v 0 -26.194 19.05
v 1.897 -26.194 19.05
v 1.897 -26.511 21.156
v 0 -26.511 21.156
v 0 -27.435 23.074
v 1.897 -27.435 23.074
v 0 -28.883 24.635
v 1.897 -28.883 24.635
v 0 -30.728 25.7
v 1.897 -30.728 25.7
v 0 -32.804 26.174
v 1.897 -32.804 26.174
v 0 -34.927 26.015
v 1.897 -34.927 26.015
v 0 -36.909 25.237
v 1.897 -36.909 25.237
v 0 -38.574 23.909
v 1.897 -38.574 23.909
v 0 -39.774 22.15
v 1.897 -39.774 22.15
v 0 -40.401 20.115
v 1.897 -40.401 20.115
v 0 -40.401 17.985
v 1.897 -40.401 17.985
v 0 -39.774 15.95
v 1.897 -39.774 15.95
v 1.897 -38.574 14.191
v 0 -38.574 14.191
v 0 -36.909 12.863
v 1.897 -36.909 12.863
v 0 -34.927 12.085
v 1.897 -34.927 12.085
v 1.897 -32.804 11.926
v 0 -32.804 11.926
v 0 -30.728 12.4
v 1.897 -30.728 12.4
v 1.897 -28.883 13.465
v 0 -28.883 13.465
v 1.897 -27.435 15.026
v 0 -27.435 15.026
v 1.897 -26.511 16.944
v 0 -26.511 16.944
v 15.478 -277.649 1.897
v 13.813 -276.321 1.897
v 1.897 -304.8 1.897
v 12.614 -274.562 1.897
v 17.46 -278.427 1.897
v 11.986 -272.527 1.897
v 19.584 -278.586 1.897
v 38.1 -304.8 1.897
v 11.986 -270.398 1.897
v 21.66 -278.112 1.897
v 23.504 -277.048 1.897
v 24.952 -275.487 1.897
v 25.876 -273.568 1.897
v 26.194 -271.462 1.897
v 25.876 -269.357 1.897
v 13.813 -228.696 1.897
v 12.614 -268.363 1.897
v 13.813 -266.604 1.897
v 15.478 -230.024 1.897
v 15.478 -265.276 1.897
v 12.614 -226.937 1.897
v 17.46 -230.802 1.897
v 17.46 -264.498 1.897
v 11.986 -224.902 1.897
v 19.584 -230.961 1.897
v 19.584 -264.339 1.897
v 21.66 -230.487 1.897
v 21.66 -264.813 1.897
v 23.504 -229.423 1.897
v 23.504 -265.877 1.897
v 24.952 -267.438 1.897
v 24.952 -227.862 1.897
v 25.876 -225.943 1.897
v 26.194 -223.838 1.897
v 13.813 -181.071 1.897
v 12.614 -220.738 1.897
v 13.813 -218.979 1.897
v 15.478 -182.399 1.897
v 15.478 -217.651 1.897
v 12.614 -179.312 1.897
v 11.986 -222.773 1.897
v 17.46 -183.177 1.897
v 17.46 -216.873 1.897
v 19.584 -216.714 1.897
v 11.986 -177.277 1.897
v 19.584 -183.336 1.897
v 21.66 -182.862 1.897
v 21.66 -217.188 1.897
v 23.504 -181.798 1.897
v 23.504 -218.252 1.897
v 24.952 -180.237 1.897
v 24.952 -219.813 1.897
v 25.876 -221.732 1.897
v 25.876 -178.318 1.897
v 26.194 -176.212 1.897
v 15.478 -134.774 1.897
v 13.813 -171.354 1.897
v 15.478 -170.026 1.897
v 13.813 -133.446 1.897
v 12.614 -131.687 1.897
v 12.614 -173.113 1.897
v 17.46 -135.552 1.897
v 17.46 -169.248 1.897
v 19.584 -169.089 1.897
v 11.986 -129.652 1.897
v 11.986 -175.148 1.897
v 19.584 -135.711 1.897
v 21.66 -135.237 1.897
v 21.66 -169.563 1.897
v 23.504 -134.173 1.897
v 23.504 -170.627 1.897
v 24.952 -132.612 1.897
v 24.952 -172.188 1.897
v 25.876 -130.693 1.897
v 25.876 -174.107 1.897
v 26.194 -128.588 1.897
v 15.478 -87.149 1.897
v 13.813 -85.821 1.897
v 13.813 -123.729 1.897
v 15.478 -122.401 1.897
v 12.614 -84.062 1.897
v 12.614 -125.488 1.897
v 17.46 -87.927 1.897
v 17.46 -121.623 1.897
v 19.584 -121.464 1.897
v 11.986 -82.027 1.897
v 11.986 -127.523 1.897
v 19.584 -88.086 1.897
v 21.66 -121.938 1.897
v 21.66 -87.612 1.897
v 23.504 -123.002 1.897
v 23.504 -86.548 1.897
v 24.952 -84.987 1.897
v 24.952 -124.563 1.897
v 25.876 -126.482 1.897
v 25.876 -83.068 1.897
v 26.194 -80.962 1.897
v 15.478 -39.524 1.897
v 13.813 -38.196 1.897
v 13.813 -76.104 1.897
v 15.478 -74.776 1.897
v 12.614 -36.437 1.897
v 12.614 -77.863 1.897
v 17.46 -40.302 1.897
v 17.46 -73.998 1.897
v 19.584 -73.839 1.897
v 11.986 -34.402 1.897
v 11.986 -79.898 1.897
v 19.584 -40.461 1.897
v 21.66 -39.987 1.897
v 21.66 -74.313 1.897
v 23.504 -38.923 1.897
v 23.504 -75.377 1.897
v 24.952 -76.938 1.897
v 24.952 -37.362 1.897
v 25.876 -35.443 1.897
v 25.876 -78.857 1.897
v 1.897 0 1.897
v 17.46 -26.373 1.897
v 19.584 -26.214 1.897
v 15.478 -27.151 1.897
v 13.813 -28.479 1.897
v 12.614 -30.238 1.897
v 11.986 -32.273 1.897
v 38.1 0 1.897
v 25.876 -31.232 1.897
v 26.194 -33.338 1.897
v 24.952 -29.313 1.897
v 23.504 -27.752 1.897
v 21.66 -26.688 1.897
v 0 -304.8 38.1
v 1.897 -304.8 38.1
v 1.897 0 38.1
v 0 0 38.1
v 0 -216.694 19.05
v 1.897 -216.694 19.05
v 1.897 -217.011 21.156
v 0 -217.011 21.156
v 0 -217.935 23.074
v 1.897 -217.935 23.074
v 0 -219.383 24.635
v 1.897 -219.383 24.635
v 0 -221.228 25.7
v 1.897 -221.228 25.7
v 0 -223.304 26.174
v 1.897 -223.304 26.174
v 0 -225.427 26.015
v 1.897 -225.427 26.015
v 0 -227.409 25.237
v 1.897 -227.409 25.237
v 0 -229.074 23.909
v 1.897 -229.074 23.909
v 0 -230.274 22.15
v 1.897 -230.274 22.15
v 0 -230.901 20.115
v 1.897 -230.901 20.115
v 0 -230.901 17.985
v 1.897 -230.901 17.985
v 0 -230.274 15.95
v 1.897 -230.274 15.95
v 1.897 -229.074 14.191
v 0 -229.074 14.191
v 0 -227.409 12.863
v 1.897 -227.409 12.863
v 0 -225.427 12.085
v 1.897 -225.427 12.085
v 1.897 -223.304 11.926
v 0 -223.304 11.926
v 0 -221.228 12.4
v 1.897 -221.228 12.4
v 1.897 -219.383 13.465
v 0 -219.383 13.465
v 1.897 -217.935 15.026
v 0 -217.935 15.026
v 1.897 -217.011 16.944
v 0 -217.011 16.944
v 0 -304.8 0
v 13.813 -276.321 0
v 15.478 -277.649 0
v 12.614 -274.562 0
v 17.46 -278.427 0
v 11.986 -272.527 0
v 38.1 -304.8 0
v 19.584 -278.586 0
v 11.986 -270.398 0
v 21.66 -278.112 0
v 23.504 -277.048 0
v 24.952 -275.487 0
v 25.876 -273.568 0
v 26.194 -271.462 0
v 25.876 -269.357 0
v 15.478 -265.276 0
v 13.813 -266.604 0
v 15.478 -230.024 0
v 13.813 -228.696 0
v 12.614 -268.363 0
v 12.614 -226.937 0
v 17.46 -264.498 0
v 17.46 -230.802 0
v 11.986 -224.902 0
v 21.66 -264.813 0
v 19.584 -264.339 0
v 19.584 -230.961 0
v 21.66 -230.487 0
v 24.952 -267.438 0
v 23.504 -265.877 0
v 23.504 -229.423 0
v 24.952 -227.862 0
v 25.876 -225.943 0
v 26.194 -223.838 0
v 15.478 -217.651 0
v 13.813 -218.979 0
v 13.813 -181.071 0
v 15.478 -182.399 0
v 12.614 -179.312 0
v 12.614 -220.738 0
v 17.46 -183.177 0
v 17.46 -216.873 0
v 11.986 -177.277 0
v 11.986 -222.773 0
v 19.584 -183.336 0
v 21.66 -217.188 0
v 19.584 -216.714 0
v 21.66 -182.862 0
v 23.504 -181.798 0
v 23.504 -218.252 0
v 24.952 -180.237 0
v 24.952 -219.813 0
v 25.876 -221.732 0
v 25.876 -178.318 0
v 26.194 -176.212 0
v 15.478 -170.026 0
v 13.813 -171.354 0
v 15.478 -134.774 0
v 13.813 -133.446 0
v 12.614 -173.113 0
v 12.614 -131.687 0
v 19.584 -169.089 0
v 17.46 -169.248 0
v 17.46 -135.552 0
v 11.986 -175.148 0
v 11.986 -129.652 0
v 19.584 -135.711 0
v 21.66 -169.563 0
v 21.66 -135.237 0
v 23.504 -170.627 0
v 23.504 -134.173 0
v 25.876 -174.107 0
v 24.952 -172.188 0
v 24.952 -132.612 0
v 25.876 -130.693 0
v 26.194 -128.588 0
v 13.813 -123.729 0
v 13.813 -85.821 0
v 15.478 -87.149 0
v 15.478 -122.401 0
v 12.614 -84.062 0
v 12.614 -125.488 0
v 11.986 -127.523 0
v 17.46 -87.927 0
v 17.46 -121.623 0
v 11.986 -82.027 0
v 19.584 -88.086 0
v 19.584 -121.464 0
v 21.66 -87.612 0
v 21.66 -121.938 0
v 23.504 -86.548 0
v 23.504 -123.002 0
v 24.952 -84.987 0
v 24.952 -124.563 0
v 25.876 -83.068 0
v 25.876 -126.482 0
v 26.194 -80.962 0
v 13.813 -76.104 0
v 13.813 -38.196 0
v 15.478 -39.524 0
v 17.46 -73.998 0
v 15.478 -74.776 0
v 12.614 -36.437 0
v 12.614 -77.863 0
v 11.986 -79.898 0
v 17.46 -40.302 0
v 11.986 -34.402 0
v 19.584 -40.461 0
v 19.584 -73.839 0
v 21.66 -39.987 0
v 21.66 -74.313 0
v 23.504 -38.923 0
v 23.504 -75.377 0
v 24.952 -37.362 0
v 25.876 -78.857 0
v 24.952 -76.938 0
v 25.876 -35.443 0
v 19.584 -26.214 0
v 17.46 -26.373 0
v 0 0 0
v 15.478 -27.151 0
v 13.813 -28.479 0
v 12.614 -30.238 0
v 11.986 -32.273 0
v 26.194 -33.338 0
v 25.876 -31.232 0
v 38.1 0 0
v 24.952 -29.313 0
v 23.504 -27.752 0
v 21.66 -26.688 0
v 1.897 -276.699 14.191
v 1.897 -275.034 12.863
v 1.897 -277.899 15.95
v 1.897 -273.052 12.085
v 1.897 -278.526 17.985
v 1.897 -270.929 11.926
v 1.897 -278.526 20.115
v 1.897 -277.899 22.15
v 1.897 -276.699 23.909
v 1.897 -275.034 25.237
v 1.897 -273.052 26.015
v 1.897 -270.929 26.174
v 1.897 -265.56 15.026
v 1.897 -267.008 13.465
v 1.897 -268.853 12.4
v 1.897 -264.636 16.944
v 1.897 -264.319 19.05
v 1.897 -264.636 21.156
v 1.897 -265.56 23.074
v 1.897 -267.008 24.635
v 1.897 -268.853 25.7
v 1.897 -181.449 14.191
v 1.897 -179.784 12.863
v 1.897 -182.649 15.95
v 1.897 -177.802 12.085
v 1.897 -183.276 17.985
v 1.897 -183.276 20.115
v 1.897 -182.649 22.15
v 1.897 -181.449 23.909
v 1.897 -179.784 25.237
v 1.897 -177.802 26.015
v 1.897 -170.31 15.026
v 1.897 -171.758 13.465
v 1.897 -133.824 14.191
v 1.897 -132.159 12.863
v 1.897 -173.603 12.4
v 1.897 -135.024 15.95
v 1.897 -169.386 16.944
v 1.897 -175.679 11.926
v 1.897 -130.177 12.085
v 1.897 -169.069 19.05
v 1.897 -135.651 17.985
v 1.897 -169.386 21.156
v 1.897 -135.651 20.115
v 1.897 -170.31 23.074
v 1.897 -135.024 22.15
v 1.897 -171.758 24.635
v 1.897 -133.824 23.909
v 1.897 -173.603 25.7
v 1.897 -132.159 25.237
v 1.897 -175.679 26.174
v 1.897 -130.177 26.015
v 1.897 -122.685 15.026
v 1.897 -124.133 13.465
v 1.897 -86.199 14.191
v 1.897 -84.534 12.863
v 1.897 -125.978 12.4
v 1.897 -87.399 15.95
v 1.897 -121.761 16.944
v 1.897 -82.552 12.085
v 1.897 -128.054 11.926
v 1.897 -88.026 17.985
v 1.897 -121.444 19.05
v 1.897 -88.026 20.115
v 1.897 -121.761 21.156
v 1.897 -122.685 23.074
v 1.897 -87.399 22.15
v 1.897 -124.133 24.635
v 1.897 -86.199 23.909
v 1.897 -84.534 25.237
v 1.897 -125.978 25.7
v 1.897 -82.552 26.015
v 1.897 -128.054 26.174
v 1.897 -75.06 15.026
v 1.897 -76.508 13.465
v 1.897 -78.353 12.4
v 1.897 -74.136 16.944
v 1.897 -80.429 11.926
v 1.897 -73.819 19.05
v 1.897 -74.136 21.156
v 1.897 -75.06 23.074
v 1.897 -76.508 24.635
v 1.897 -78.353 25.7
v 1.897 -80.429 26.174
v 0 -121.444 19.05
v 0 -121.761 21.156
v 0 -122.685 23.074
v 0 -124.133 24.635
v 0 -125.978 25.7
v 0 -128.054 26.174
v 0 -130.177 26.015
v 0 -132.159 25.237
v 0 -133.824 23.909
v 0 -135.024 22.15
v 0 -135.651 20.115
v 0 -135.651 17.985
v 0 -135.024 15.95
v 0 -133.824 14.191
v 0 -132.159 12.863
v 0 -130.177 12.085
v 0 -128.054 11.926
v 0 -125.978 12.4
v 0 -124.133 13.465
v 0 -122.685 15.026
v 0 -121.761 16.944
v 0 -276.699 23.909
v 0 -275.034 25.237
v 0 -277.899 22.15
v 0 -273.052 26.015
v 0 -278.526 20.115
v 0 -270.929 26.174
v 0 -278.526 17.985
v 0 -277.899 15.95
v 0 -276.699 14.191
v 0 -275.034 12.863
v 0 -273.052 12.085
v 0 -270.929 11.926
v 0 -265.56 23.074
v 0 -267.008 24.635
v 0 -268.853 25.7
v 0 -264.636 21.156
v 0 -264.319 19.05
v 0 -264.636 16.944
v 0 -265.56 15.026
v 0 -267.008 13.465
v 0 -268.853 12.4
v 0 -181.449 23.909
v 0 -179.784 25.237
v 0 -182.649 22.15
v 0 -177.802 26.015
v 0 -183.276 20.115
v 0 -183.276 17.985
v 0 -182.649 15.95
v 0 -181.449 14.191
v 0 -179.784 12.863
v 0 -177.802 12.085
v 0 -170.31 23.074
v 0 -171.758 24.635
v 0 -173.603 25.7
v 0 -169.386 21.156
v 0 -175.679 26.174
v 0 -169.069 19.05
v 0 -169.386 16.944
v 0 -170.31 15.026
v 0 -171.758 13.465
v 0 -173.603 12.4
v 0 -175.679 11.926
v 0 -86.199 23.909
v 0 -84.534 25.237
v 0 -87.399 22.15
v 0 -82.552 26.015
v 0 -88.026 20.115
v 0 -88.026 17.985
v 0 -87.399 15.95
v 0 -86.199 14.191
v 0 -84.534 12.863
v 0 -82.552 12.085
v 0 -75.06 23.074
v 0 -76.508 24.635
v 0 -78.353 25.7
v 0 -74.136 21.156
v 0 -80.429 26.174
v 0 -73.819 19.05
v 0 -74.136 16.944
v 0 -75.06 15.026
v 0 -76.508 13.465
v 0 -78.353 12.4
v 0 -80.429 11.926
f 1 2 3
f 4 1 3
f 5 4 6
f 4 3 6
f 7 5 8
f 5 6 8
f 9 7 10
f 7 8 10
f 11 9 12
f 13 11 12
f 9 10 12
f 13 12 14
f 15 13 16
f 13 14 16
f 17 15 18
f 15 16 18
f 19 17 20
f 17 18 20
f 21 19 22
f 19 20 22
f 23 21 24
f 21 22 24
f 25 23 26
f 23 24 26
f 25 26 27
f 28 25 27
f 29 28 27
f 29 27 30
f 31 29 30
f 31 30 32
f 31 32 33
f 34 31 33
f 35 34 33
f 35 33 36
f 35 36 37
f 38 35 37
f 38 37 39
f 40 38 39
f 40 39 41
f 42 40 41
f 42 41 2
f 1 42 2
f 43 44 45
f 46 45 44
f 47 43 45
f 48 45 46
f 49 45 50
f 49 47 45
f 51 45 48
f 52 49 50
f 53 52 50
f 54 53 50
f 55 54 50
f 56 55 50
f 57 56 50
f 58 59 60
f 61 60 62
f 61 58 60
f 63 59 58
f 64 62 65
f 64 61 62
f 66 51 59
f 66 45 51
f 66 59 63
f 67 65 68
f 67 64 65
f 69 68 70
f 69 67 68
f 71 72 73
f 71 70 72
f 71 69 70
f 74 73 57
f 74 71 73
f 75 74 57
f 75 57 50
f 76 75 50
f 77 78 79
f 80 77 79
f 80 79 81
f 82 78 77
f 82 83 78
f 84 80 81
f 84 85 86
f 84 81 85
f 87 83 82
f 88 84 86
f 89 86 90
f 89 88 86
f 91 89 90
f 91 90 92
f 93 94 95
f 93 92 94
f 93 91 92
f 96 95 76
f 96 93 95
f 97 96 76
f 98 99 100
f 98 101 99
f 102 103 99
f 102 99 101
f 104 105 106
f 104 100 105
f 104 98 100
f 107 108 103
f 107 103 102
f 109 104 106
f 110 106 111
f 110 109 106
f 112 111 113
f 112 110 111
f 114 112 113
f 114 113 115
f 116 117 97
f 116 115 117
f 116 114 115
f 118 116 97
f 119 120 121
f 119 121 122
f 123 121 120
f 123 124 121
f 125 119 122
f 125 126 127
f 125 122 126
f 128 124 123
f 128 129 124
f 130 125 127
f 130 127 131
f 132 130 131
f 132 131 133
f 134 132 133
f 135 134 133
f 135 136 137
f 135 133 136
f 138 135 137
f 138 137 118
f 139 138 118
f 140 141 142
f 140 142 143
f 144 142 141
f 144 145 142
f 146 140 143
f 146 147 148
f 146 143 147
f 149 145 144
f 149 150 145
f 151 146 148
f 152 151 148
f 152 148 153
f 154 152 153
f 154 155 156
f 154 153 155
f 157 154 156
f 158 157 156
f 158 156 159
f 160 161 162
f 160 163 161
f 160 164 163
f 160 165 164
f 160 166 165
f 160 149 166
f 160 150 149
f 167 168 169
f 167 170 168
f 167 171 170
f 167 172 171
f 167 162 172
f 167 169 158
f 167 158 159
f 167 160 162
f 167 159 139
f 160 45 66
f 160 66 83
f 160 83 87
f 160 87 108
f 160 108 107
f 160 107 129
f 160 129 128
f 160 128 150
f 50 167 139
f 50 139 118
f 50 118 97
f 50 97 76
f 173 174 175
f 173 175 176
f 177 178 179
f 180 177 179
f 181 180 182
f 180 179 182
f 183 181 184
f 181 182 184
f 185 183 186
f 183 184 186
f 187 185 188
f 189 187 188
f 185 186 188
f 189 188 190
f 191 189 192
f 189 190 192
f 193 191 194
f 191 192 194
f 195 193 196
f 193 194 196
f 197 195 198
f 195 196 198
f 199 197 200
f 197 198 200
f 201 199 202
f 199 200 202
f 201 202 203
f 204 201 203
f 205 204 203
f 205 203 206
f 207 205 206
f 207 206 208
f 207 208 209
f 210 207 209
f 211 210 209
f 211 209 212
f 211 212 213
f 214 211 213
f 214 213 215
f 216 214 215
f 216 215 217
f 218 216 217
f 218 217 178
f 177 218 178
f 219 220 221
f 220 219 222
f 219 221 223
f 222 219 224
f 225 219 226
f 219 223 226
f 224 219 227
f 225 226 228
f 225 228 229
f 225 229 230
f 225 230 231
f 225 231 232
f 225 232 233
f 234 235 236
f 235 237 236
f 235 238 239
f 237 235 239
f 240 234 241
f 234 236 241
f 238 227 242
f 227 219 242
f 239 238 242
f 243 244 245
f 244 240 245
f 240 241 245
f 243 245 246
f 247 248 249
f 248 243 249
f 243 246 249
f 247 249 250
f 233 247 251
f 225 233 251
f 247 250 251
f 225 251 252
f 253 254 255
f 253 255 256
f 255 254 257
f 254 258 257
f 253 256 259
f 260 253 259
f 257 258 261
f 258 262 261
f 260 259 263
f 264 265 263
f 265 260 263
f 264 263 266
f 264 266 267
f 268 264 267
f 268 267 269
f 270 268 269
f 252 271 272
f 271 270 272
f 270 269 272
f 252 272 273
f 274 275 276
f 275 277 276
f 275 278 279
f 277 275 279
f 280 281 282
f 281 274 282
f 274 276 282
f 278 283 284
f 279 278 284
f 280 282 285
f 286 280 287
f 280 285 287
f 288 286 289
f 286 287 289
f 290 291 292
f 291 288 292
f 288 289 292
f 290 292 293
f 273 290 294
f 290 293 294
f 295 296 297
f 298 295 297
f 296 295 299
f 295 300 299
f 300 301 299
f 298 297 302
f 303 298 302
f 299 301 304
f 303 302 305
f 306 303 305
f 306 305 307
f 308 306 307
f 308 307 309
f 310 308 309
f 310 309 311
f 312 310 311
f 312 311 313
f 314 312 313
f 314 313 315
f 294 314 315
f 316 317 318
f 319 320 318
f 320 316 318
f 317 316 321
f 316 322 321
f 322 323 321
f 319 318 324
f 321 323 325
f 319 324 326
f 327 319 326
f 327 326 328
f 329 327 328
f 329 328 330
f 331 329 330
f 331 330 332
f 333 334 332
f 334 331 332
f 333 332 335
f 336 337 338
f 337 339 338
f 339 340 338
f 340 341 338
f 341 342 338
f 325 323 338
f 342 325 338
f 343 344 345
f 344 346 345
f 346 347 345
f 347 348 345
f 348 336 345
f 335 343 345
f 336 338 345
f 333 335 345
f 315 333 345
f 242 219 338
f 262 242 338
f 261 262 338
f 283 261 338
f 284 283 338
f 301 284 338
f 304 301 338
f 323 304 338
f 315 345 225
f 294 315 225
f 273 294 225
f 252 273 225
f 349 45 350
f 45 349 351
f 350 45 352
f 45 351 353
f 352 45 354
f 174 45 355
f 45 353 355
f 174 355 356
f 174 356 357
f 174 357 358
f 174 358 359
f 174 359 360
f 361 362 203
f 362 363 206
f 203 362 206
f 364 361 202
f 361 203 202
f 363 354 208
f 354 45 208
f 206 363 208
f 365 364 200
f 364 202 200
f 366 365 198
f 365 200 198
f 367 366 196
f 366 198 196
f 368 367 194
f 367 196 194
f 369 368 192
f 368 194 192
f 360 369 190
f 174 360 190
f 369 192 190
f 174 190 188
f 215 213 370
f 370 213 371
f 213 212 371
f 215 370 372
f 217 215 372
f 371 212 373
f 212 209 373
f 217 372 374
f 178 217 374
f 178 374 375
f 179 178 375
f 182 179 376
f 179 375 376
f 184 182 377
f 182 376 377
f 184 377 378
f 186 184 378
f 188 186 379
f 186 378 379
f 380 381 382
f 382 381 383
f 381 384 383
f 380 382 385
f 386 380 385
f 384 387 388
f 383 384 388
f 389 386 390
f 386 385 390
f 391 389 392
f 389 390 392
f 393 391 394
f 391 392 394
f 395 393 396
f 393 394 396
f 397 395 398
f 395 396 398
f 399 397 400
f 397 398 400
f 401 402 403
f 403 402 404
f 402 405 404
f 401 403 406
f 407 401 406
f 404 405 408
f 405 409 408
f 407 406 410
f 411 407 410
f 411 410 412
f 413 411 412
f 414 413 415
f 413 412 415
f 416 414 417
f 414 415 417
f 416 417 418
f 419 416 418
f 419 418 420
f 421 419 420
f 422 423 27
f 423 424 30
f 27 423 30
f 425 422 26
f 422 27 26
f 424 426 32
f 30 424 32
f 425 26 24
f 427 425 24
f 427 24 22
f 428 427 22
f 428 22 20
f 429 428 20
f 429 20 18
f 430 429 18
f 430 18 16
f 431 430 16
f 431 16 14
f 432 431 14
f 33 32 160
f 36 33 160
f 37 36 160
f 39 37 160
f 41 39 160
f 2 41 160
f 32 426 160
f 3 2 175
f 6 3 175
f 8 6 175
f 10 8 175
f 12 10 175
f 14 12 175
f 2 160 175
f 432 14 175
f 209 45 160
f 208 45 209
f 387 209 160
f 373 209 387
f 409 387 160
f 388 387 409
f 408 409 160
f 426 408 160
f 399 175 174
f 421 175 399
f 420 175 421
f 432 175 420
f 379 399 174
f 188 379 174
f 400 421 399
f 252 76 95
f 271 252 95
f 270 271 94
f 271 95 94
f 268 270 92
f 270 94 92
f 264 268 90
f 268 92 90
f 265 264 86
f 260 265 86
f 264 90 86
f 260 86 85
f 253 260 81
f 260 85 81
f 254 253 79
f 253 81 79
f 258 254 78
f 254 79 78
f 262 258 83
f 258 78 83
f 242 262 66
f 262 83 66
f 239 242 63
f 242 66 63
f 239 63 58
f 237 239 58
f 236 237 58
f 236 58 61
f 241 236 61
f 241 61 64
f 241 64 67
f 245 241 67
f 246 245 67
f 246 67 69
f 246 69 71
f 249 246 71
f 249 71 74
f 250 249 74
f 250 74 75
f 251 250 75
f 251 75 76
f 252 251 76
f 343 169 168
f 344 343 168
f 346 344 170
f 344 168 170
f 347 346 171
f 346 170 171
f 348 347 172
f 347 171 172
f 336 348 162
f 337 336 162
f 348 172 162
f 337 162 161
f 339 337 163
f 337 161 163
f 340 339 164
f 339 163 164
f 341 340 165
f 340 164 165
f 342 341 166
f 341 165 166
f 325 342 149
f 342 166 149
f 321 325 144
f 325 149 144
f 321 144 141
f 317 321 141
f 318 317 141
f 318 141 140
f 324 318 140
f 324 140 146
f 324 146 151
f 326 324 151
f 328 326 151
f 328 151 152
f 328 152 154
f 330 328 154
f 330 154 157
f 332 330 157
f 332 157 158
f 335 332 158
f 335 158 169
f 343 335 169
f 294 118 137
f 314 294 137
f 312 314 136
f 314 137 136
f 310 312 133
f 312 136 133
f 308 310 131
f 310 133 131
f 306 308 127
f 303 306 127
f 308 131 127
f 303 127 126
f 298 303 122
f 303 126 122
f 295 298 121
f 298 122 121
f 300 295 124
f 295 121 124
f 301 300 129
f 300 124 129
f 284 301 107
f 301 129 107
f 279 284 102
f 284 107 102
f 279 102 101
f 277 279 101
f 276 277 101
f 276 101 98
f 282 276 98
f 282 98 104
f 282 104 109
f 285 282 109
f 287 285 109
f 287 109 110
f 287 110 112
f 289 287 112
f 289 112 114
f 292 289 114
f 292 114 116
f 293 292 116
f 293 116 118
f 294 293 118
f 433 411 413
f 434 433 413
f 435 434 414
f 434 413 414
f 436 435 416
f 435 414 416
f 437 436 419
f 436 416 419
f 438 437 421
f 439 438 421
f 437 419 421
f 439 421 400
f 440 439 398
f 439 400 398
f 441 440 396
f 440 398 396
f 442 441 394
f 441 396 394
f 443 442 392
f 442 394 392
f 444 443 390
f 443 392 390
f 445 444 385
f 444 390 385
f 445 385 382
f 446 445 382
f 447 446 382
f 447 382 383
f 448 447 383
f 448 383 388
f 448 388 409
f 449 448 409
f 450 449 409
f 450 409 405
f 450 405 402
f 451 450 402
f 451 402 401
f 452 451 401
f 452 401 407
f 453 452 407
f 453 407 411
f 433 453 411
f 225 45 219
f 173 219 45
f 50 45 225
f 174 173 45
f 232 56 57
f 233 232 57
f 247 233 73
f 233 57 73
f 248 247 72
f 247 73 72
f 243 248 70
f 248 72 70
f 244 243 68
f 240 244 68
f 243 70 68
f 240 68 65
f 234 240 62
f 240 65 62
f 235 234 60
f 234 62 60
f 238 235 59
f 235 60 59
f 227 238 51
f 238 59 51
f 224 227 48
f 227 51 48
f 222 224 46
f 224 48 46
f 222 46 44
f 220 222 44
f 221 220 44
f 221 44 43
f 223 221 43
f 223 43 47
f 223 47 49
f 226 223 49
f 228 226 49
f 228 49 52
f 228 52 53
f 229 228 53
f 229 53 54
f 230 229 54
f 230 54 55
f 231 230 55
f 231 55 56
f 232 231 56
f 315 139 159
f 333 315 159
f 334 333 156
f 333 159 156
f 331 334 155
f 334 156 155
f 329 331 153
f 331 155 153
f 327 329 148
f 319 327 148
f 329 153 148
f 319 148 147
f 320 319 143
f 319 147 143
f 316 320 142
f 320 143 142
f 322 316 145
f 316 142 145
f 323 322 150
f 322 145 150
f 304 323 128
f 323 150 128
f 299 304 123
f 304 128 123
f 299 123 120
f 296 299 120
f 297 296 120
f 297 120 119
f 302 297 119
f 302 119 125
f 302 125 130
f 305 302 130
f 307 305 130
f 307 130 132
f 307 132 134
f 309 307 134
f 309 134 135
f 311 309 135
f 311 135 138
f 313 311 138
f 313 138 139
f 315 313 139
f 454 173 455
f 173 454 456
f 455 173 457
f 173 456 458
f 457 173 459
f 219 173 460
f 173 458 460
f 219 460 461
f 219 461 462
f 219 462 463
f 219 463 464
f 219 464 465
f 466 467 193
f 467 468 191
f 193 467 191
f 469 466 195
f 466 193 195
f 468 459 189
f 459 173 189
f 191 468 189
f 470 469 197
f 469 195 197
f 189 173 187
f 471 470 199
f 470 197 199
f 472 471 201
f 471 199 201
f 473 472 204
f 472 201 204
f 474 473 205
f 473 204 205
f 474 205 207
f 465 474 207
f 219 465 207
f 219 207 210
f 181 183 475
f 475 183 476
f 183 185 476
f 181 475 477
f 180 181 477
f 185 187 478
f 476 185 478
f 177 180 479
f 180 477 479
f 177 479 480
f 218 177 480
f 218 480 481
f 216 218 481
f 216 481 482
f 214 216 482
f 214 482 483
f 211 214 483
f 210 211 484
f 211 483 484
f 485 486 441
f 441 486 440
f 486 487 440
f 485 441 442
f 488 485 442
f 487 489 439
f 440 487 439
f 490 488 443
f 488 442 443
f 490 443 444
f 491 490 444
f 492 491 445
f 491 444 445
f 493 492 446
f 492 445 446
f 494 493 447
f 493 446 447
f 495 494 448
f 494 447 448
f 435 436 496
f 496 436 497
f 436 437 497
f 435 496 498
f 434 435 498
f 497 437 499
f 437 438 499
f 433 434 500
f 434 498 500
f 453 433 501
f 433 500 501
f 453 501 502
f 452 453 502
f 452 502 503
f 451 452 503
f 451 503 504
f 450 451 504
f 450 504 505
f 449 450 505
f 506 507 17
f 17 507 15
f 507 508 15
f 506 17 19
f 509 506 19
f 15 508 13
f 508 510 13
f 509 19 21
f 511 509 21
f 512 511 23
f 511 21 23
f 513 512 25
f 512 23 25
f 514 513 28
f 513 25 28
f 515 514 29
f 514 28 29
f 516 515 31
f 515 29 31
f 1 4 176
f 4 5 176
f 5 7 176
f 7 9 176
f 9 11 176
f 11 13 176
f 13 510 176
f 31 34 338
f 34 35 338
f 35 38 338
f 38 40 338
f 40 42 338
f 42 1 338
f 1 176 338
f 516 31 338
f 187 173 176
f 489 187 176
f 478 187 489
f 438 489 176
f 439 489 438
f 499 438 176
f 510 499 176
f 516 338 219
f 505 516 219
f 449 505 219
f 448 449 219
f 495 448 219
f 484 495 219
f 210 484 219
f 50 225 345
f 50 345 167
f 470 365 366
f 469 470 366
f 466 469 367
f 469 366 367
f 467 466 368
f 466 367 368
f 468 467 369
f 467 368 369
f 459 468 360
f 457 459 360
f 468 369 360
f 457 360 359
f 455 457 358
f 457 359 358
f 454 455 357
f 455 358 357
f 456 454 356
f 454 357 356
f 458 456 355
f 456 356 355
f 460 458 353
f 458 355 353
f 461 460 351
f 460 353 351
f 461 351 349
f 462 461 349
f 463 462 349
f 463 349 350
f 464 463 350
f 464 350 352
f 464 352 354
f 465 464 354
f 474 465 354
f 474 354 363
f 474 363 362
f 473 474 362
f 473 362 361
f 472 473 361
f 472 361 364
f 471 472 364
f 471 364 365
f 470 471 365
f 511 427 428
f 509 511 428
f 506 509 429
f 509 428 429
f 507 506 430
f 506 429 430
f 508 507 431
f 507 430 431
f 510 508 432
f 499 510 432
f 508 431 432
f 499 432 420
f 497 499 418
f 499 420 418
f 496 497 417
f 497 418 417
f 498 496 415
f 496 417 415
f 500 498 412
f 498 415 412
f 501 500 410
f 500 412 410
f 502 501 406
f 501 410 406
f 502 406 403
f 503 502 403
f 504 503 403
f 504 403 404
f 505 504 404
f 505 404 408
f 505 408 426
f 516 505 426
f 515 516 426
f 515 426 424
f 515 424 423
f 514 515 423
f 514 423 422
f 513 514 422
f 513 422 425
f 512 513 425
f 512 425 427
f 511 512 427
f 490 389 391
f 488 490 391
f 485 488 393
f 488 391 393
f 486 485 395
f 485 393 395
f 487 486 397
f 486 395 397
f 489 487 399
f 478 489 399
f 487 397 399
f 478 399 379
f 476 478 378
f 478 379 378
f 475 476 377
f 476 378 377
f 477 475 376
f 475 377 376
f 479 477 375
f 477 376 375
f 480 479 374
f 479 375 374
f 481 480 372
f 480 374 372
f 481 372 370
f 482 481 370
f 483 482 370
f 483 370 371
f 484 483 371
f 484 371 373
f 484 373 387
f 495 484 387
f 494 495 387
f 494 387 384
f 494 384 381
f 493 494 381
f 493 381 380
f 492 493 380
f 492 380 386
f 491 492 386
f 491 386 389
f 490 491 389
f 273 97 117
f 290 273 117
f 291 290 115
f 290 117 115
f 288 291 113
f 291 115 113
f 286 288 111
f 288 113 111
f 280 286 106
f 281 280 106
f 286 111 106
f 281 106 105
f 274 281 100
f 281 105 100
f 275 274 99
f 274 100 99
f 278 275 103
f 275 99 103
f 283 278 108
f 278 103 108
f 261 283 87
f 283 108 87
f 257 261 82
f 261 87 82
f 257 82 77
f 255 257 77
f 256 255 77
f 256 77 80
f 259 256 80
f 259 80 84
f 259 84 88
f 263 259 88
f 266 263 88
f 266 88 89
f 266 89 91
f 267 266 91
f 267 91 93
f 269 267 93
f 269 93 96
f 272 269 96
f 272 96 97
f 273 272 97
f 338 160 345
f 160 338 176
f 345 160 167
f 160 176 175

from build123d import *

# Parameters (mm, degrees)
F0_W     = 36.20262
F0_H     = 1.89738
F1_DEPTH = 304.8
F2_R     = 7.14375
F3_DEPTH = 25.4
F4_R     = 7.14375
F5_DEPTH = 25.4


with BuildPart() as f1:
    # F0 (on Front) → F1 (new body)
    with BuildSketch(Plane.XZ):
        with Locations((19.99869, 0.94869)):
            Rectangle(F0_W, F0_H)
        Polygon((0, 38.1), (0, 0), (1.89738, 0), (1.89738, 1.89738), (1.89738, 38.1), align=None)
    extrude(amount=F1_DEPTH)

    # F2 (on face) → F3 (cut)
    with BuildSketch(Plane.XY.offset(1.89738)):
        with Locations((19.05, -271.4625)):
            Circle(F2_R)
        with Locations((19.05, -223.8375)):
            Circle(F2_R)
        with Locations((19.05, -176.2125)):
            Circle(F2_R)
        with Locations((19.05, -128.5875)):
            Circle(F2_R)
        with Locations((19.05, -80.9625)):
            Circle(F2_R)
        with Locations((19.05, -33.3375)):
            Circle(F2_R)
    extrude(amount=-F3_DEPTH, mode=Mode.SUBTRACT)

    # F4 (on face) → F5 (cut)
    with BuildSketch(Plane.YZ.offset(1.89738)):
        with Locations((-271.4625, 19.05)):
            Circle(F4_R)
        with Locations((-223.8375, 19.05)):
            Circle(F4_R)
        with Locations((-176.2125, 19.05)):
            Circle(F4_R)
        with Locations((-128.5875, 19.05)):
            Circle(F4_R)
        with Locations((-80.9625, 19.05)):
            Circle(F4_R)
        with Locations((-33.3375, 19.05)):
            Circle(F4_R)
    extrude(amount=-F5_DEPTH, mode=Mode.SUBTRACT)


solid = f1.part
